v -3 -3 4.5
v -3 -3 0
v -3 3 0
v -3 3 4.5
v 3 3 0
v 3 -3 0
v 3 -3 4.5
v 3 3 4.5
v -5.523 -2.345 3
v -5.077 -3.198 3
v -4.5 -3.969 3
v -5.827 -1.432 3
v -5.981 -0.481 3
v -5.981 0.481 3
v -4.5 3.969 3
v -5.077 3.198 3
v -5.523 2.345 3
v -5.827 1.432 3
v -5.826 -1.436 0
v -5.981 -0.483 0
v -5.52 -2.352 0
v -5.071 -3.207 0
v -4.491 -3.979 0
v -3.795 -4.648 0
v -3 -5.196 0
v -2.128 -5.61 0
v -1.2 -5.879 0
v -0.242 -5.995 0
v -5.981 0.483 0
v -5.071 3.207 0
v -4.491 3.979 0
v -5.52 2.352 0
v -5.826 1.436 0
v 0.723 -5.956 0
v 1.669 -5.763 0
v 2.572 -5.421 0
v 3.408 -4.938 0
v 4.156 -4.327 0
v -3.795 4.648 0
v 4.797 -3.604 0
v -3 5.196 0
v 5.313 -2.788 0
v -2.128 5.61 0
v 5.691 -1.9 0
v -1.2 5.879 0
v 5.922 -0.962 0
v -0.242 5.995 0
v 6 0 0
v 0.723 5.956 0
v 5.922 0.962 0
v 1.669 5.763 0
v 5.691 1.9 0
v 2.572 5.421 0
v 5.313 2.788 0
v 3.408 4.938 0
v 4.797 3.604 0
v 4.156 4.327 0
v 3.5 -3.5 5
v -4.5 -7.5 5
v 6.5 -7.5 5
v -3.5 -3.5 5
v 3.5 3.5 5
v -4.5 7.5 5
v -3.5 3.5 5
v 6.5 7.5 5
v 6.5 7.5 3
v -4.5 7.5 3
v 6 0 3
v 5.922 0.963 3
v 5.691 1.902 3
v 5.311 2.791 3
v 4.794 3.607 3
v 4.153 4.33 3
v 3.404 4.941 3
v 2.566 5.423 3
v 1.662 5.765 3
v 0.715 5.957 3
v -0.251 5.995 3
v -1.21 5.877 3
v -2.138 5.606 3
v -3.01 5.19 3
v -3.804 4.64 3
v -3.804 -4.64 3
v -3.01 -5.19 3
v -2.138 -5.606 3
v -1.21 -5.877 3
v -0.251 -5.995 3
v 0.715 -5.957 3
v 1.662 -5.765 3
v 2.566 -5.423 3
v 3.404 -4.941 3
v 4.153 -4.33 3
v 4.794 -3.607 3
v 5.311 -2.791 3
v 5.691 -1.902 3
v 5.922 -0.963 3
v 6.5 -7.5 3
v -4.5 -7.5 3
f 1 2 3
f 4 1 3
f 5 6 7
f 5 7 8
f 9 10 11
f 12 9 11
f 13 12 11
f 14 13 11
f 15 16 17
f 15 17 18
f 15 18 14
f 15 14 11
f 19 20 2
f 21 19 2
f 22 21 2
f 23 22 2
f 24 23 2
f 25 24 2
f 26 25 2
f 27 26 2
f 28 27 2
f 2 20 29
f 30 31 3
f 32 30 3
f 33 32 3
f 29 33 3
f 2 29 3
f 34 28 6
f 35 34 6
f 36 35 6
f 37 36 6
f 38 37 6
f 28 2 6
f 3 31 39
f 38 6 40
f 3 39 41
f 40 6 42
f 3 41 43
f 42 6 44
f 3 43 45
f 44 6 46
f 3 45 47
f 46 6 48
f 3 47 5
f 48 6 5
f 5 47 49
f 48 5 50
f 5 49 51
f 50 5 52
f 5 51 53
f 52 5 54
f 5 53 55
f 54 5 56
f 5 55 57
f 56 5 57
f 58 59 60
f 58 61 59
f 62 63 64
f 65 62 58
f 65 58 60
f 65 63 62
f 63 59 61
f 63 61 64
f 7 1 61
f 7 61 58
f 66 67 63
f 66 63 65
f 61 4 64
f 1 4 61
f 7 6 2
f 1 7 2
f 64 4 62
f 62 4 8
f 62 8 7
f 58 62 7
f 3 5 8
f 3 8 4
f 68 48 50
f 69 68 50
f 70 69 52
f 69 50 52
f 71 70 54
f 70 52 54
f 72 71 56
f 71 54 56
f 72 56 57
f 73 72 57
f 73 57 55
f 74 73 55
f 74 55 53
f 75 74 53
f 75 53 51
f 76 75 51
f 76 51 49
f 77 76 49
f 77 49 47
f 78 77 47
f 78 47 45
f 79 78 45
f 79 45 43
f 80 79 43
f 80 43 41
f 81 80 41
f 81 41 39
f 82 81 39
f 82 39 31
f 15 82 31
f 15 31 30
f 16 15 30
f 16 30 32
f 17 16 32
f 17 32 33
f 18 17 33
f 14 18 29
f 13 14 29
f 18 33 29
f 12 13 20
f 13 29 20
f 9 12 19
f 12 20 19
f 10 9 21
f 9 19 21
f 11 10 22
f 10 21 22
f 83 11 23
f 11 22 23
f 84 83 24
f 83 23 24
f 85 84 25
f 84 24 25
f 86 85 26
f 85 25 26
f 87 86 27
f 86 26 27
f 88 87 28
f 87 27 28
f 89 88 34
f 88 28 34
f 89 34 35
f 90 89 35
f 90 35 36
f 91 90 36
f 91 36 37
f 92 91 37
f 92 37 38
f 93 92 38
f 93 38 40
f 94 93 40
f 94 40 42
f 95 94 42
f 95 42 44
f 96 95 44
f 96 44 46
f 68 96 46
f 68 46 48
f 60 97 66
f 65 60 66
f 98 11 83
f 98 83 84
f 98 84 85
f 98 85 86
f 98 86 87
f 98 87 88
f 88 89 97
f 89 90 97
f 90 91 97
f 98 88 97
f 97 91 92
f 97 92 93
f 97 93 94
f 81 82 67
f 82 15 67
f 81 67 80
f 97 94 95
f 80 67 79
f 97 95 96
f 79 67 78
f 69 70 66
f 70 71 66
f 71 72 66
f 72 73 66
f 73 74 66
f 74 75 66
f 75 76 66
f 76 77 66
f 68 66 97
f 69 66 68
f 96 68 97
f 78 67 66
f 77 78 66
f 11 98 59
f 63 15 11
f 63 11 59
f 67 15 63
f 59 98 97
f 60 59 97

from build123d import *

# Parameters (mm, degrees)
SKETCH1_R           = 6
BOSS_EXTRUDE1_DEPTH = 3
SKETCH2_W           = 11
SKETCH2_H           = 15
BOSS_EXTRUDE2_DEPTH = 2
SKETCH3_W           = 6
SKETCH3_H           = 6
CUT_EXTRUDE1_DEPTH  = 12.113055385
CHAMFER1_SIZE       = 0.5


with BuildPart() as part:
    # Sketch1 → Boss-Extrude1 (new body)
    with BuildSketch(Plane.XY):
        Circle(SKETCH1_R)
    extrude(amount=BOSS_EXTRUDE1_DEPTH)

    # Sketch2 → Boss-Extrude2 (add)
    with BuildSketch(Plane.XY.offset(3)):
        with Locations((1, 0)):
            Rectangle(SKETCH2_W, SKETCH2_H)
    extrude(amount=BOSS_EXTRUDE2_DEPTH)

    # Sketch3 → Cut-Extrude1 (cut, through all)
    with BuildSketch(Plane(origin=(0, 0, 0), x_dir=(-1, 0, 0), z_dir=(0, 0, -1))):
        Rectangle(SKETCH3_W, SKETCH3_H)
    extrude(amount=-CUT_EXTRUDE1_DEPTH, mode=Mode.SUBTRACT)

    # Chamfer1
    chamfer1_edges = [part.edges().sort_by_distance(p)[0] for p in [
        (3, 0, 5),
        (0, 3, 5),
        (-3, 0, 5),
        (0, -3, 5),
    ]]
    chamfer(chamfer1_edges, length=CHAMFER1_SIZE)


solid = part.part
